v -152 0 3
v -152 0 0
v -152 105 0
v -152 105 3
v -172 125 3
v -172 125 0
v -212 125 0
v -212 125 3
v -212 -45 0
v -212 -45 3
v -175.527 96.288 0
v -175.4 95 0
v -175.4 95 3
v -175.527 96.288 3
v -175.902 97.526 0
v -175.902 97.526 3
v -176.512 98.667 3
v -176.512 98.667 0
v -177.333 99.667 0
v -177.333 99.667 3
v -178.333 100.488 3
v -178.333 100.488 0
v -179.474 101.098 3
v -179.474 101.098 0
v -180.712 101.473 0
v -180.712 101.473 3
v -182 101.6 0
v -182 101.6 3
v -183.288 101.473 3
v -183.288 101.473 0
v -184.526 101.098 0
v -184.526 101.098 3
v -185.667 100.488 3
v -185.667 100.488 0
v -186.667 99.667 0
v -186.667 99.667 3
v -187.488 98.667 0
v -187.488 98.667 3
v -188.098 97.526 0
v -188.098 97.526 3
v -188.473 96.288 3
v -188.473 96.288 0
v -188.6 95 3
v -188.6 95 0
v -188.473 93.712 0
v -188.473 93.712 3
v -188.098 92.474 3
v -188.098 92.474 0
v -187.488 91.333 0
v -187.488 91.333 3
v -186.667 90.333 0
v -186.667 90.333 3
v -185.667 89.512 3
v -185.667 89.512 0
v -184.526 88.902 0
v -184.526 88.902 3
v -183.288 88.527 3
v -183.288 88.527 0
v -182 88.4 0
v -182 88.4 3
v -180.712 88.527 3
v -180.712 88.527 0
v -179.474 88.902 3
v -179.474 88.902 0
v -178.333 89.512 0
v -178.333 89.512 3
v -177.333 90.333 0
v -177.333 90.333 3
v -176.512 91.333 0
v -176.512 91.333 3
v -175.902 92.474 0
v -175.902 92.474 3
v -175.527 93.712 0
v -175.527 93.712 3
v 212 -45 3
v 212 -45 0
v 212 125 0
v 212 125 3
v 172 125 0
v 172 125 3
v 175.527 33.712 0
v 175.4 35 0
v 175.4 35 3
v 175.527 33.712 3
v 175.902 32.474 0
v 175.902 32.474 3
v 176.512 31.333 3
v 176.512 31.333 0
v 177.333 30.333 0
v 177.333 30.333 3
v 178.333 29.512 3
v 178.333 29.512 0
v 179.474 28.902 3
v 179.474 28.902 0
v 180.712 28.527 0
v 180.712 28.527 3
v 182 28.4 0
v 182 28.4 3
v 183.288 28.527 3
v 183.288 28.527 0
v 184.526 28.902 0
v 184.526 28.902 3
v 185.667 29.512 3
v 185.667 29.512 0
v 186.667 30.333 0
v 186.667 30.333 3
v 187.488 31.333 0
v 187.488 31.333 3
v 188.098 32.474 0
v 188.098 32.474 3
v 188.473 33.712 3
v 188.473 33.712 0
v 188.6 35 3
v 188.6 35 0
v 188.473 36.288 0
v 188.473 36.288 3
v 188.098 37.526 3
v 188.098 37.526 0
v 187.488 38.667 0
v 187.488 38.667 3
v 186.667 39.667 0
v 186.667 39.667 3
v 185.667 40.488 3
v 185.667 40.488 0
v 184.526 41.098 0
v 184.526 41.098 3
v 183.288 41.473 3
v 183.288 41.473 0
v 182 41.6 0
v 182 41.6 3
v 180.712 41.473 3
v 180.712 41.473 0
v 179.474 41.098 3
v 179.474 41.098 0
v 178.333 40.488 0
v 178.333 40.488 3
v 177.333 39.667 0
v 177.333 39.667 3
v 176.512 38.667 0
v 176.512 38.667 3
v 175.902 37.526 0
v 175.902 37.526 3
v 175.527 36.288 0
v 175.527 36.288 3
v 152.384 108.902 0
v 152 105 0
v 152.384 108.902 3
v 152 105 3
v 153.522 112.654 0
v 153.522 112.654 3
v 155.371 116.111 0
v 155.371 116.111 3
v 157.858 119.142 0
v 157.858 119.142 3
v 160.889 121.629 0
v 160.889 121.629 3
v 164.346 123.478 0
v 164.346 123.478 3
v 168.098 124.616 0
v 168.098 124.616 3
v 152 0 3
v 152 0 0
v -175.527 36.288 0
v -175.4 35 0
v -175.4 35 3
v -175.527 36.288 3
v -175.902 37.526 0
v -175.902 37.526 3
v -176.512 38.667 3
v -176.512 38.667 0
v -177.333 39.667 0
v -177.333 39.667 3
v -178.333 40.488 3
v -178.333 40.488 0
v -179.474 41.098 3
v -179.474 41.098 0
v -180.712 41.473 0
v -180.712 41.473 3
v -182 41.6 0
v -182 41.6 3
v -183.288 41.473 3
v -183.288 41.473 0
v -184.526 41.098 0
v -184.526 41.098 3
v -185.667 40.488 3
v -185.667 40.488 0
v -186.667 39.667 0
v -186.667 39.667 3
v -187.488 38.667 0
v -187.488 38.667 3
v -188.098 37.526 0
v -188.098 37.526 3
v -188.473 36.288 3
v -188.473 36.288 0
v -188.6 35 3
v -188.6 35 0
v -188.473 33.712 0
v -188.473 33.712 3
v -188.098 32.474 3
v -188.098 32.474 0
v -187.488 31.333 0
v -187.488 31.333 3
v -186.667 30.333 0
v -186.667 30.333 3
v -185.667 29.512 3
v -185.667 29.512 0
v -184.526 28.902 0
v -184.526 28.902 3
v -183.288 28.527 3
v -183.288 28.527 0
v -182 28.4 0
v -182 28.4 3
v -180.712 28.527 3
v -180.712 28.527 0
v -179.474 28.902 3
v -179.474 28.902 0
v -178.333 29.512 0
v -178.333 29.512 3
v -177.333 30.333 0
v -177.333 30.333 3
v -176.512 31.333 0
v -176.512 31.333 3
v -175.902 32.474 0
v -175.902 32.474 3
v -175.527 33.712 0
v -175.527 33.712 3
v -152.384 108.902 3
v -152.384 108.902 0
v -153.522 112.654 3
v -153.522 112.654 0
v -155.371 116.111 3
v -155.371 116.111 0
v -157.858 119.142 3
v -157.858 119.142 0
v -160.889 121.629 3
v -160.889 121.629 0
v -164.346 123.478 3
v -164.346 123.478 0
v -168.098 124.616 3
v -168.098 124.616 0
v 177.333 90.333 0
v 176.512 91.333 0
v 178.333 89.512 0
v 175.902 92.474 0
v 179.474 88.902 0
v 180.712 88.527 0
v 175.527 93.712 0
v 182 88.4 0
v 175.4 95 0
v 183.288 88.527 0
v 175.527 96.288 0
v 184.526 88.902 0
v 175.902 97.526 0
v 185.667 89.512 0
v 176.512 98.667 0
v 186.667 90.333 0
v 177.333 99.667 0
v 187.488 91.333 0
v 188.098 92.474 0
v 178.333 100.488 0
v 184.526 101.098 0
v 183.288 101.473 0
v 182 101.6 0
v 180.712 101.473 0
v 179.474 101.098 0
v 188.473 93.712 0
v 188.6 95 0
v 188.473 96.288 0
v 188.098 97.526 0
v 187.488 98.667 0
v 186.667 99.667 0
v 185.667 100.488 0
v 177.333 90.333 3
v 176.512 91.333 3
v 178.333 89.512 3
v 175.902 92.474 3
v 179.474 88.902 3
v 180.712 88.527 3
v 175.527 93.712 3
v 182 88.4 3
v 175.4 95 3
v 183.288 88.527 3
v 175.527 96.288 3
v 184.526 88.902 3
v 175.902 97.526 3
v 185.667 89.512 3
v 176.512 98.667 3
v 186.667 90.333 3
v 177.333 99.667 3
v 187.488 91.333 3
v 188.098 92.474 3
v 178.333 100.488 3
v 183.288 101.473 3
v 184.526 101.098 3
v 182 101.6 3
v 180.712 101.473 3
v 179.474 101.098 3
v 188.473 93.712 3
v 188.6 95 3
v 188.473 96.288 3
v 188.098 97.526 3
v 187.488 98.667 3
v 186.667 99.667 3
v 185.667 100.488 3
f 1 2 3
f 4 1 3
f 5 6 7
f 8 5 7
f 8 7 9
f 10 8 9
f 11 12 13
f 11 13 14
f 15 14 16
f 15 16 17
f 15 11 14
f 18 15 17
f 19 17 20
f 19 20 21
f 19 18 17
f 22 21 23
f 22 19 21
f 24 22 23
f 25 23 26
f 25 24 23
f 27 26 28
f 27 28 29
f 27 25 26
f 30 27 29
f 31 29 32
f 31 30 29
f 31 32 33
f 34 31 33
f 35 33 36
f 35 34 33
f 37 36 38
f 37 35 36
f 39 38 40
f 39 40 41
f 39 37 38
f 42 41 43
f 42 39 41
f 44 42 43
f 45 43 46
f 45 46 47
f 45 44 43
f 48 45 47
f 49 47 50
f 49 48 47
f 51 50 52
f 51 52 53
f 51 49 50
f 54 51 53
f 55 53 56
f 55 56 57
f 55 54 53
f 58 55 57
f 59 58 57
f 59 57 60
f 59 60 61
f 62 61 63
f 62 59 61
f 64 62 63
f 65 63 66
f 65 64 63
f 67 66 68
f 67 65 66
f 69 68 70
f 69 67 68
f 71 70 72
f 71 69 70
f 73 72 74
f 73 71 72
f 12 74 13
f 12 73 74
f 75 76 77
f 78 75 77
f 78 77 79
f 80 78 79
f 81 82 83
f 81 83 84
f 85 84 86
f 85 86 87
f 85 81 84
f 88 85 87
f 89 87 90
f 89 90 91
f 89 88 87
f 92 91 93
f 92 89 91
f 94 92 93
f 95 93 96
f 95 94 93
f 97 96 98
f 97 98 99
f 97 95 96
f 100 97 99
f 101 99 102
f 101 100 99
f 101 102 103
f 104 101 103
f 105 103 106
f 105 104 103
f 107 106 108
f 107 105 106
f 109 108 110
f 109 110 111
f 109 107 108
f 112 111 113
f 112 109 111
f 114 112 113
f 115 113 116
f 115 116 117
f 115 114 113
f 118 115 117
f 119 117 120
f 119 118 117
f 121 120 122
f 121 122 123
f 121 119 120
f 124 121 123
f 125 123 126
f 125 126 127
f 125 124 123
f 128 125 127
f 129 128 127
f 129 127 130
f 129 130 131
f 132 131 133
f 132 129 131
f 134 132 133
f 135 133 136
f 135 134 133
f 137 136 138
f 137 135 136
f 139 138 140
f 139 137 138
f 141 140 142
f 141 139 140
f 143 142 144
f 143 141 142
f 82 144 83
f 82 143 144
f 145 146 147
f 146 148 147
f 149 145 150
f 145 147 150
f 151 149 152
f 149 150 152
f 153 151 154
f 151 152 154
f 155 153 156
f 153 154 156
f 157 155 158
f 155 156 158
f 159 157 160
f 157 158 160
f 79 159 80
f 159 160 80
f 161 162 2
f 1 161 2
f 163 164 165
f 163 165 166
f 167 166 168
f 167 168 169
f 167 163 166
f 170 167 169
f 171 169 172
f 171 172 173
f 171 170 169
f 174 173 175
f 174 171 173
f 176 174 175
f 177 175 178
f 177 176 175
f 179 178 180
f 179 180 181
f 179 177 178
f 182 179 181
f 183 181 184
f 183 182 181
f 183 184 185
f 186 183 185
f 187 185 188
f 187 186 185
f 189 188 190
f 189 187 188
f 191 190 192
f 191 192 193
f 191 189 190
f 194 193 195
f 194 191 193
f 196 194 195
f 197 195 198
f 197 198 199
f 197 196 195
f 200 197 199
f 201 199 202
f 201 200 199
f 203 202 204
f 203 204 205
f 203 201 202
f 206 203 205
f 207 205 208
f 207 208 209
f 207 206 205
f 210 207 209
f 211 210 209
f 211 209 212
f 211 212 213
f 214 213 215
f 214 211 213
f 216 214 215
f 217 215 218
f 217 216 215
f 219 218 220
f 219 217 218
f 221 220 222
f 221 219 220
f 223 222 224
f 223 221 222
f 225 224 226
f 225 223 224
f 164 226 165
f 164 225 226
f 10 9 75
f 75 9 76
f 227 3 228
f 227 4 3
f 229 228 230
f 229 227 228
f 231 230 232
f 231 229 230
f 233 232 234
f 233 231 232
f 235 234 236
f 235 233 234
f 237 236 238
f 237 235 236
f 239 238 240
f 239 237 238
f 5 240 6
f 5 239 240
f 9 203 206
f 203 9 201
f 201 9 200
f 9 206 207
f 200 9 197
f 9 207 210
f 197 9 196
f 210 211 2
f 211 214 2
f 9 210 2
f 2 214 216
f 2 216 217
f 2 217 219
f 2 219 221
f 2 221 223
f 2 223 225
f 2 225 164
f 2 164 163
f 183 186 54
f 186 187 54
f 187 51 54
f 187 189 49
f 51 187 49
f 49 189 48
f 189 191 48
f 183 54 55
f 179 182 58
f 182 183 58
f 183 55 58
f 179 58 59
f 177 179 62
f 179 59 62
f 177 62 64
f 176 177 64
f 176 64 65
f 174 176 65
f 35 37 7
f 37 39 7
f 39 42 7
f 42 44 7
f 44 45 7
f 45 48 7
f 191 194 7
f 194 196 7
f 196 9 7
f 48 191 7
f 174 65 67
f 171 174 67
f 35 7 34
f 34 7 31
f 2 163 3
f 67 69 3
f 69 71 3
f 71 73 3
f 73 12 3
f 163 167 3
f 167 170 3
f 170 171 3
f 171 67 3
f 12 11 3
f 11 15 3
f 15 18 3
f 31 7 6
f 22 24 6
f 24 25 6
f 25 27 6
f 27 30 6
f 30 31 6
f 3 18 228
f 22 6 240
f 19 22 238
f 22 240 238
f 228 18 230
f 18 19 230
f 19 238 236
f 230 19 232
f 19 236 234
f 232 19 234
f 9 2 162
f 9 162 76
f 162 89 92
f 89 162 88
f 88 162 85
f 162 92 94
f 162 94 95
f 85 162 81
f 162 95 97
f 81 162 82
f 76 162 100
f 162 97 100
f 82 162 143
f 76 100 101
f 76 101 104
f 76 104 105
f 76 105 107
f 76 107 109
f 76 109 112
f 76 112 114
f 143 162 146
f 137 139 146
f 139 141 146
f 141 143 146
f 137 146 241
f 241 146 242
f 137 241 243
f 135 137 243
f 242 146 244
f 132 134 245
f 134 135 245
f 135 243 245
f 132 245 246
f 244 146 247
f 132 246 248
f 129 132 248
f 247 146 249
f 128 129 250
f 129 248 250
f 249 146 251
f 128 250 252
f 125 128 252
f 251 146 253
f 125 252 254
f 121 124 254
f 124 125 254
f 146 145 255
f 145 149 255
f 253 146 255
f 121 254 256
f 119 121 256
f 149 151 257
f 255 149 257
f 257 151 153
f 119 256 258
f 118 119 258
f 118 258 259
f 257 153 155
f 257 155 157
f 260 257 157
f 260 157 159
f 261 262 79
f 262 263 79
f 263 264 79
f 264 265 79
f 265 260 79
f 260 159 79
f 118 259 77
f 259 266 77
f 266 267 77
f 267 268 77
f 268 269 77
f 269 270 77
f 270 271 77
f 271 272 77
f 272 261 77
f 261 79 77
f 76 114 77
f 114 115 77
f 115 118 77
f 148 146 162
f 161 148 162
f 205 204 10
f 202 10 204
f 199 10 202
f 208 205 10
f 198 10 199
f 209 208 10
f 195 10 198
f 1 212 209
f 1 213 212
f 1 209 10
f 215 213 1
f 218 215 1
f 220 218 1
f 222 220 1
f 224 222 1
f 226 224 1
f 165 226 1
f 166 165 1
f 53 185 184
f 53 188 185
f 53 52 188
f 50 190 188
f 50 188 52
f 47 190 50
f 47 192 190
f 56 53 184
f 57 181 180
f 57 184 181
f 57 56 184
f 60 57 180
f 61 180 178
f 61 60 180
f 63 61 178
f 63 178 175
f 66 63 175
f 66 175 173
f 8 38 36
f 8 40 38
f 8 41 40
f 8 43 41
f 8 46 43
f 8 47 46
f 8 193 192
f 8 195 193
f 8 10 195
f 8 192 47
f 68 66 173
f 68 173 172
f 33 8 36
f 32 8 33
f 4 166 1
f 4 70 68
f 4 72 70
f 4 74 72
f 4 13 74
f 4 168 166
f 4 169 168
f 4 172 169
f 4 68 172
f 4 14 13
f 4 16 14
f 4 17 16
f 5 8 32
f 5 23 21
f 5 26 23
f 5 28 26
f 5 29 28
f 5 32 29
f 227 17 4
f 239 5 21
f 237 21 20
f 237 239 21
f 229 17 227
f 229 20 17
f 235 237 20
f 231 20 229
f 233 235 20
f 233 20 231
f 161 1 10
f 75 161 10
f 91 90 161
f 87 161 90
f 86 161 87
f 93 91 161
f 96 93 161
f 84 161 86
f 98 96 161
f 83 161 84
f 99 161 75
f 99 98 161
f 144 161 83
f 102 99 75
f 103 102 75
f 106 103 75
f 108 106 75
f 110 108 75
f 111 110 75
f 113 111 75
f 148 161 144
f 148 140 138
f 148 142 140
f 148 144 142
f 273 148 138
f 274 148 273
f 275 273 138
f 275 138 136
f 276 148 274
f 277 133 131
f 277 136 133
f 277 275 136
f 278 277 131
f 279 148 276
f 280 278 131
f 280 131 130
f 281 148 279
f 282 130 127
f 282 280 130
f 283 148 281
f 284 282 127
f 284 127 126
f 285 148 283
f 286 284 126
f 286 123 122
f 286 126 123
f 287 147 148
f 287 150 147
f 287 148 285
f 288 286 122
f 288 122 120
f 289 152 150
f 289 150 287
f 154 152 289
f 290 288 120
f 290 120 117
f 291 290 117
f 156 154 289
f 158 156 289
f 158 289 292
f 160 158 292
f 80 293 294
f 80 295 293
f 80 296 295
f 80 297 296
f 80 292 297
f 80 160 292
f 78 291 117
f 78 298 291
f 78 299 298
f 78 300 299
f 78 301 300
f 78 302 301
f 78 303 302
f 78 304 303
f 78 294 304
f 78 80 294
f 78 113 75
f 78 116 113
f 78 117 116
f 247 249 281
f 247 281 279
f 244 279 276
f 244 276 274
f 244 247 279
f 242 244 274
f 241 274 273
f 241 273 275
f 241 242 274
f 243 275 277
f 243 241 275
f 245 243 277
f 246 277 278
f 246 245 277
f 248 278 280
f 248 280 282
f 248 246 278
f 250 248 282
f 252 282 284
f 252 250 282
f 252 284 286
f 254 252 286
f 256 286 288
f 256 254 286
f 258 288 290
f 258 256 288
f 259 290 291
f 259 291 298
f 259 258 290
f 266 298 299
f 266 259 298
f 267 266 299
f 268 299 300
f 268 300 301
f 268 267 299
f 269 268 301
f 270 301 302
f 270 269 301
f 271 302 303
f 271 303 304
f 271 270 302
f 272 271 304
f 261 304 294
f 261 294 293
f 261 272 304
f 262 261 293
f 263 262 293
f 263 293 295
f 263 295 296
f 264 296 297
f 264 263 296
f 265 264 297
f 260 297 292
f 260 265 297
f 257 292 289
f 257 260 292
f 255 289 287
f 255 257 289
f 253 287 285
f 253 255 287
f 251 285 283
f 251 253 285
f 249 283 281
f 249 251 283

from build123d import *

# Parameters (mm, degrees)
SKETCH_1_R      = 6.6
EXTRUDE_1_DEPTH = 3
FILLET_1_R      = 20


with BuildPart() as part:
    # Эскиз1 → Бобышка-Вытянуть1 (new body)
    with BuildSketch(Plane.XY):
        Polygon((152, 0), (-152, 0), (-152, 125), (-212, 125), (-212, -45), (212, -45), (212, 125), (152, 125), align=None)
        with Locations((-182, 95)):
            Circle(SKETCH_1_R, mode=Mode.SUBTRACT)
        with Locations((-182, 35)):
            Circle(SKETCH_1_R, mode=Mode.SUBTRACT)
        with Locations(Location((182, 35, 0), (0, 0, 180))):
            Circle(SKETCH_1_R, mode=Mode.SUBTRACT)
        with Locations(Location((182, 95, 0), (0, 0, 180))):
            Circle(SKETCH_1_R, mode=Mode.SUBTRACT)
    extrude(amount=EXTRUDE_1_DEPTH)

    # Скругление1
    fillet_1_edges = [part.edges().sort_by_distance(p)[0] for p in [
        (-152, 125, 1.5),
        (152, 125, 1.5),
    ]]
    fillet(fillet_1_edges, radius=FILLET_1_R)


solid = part.part
